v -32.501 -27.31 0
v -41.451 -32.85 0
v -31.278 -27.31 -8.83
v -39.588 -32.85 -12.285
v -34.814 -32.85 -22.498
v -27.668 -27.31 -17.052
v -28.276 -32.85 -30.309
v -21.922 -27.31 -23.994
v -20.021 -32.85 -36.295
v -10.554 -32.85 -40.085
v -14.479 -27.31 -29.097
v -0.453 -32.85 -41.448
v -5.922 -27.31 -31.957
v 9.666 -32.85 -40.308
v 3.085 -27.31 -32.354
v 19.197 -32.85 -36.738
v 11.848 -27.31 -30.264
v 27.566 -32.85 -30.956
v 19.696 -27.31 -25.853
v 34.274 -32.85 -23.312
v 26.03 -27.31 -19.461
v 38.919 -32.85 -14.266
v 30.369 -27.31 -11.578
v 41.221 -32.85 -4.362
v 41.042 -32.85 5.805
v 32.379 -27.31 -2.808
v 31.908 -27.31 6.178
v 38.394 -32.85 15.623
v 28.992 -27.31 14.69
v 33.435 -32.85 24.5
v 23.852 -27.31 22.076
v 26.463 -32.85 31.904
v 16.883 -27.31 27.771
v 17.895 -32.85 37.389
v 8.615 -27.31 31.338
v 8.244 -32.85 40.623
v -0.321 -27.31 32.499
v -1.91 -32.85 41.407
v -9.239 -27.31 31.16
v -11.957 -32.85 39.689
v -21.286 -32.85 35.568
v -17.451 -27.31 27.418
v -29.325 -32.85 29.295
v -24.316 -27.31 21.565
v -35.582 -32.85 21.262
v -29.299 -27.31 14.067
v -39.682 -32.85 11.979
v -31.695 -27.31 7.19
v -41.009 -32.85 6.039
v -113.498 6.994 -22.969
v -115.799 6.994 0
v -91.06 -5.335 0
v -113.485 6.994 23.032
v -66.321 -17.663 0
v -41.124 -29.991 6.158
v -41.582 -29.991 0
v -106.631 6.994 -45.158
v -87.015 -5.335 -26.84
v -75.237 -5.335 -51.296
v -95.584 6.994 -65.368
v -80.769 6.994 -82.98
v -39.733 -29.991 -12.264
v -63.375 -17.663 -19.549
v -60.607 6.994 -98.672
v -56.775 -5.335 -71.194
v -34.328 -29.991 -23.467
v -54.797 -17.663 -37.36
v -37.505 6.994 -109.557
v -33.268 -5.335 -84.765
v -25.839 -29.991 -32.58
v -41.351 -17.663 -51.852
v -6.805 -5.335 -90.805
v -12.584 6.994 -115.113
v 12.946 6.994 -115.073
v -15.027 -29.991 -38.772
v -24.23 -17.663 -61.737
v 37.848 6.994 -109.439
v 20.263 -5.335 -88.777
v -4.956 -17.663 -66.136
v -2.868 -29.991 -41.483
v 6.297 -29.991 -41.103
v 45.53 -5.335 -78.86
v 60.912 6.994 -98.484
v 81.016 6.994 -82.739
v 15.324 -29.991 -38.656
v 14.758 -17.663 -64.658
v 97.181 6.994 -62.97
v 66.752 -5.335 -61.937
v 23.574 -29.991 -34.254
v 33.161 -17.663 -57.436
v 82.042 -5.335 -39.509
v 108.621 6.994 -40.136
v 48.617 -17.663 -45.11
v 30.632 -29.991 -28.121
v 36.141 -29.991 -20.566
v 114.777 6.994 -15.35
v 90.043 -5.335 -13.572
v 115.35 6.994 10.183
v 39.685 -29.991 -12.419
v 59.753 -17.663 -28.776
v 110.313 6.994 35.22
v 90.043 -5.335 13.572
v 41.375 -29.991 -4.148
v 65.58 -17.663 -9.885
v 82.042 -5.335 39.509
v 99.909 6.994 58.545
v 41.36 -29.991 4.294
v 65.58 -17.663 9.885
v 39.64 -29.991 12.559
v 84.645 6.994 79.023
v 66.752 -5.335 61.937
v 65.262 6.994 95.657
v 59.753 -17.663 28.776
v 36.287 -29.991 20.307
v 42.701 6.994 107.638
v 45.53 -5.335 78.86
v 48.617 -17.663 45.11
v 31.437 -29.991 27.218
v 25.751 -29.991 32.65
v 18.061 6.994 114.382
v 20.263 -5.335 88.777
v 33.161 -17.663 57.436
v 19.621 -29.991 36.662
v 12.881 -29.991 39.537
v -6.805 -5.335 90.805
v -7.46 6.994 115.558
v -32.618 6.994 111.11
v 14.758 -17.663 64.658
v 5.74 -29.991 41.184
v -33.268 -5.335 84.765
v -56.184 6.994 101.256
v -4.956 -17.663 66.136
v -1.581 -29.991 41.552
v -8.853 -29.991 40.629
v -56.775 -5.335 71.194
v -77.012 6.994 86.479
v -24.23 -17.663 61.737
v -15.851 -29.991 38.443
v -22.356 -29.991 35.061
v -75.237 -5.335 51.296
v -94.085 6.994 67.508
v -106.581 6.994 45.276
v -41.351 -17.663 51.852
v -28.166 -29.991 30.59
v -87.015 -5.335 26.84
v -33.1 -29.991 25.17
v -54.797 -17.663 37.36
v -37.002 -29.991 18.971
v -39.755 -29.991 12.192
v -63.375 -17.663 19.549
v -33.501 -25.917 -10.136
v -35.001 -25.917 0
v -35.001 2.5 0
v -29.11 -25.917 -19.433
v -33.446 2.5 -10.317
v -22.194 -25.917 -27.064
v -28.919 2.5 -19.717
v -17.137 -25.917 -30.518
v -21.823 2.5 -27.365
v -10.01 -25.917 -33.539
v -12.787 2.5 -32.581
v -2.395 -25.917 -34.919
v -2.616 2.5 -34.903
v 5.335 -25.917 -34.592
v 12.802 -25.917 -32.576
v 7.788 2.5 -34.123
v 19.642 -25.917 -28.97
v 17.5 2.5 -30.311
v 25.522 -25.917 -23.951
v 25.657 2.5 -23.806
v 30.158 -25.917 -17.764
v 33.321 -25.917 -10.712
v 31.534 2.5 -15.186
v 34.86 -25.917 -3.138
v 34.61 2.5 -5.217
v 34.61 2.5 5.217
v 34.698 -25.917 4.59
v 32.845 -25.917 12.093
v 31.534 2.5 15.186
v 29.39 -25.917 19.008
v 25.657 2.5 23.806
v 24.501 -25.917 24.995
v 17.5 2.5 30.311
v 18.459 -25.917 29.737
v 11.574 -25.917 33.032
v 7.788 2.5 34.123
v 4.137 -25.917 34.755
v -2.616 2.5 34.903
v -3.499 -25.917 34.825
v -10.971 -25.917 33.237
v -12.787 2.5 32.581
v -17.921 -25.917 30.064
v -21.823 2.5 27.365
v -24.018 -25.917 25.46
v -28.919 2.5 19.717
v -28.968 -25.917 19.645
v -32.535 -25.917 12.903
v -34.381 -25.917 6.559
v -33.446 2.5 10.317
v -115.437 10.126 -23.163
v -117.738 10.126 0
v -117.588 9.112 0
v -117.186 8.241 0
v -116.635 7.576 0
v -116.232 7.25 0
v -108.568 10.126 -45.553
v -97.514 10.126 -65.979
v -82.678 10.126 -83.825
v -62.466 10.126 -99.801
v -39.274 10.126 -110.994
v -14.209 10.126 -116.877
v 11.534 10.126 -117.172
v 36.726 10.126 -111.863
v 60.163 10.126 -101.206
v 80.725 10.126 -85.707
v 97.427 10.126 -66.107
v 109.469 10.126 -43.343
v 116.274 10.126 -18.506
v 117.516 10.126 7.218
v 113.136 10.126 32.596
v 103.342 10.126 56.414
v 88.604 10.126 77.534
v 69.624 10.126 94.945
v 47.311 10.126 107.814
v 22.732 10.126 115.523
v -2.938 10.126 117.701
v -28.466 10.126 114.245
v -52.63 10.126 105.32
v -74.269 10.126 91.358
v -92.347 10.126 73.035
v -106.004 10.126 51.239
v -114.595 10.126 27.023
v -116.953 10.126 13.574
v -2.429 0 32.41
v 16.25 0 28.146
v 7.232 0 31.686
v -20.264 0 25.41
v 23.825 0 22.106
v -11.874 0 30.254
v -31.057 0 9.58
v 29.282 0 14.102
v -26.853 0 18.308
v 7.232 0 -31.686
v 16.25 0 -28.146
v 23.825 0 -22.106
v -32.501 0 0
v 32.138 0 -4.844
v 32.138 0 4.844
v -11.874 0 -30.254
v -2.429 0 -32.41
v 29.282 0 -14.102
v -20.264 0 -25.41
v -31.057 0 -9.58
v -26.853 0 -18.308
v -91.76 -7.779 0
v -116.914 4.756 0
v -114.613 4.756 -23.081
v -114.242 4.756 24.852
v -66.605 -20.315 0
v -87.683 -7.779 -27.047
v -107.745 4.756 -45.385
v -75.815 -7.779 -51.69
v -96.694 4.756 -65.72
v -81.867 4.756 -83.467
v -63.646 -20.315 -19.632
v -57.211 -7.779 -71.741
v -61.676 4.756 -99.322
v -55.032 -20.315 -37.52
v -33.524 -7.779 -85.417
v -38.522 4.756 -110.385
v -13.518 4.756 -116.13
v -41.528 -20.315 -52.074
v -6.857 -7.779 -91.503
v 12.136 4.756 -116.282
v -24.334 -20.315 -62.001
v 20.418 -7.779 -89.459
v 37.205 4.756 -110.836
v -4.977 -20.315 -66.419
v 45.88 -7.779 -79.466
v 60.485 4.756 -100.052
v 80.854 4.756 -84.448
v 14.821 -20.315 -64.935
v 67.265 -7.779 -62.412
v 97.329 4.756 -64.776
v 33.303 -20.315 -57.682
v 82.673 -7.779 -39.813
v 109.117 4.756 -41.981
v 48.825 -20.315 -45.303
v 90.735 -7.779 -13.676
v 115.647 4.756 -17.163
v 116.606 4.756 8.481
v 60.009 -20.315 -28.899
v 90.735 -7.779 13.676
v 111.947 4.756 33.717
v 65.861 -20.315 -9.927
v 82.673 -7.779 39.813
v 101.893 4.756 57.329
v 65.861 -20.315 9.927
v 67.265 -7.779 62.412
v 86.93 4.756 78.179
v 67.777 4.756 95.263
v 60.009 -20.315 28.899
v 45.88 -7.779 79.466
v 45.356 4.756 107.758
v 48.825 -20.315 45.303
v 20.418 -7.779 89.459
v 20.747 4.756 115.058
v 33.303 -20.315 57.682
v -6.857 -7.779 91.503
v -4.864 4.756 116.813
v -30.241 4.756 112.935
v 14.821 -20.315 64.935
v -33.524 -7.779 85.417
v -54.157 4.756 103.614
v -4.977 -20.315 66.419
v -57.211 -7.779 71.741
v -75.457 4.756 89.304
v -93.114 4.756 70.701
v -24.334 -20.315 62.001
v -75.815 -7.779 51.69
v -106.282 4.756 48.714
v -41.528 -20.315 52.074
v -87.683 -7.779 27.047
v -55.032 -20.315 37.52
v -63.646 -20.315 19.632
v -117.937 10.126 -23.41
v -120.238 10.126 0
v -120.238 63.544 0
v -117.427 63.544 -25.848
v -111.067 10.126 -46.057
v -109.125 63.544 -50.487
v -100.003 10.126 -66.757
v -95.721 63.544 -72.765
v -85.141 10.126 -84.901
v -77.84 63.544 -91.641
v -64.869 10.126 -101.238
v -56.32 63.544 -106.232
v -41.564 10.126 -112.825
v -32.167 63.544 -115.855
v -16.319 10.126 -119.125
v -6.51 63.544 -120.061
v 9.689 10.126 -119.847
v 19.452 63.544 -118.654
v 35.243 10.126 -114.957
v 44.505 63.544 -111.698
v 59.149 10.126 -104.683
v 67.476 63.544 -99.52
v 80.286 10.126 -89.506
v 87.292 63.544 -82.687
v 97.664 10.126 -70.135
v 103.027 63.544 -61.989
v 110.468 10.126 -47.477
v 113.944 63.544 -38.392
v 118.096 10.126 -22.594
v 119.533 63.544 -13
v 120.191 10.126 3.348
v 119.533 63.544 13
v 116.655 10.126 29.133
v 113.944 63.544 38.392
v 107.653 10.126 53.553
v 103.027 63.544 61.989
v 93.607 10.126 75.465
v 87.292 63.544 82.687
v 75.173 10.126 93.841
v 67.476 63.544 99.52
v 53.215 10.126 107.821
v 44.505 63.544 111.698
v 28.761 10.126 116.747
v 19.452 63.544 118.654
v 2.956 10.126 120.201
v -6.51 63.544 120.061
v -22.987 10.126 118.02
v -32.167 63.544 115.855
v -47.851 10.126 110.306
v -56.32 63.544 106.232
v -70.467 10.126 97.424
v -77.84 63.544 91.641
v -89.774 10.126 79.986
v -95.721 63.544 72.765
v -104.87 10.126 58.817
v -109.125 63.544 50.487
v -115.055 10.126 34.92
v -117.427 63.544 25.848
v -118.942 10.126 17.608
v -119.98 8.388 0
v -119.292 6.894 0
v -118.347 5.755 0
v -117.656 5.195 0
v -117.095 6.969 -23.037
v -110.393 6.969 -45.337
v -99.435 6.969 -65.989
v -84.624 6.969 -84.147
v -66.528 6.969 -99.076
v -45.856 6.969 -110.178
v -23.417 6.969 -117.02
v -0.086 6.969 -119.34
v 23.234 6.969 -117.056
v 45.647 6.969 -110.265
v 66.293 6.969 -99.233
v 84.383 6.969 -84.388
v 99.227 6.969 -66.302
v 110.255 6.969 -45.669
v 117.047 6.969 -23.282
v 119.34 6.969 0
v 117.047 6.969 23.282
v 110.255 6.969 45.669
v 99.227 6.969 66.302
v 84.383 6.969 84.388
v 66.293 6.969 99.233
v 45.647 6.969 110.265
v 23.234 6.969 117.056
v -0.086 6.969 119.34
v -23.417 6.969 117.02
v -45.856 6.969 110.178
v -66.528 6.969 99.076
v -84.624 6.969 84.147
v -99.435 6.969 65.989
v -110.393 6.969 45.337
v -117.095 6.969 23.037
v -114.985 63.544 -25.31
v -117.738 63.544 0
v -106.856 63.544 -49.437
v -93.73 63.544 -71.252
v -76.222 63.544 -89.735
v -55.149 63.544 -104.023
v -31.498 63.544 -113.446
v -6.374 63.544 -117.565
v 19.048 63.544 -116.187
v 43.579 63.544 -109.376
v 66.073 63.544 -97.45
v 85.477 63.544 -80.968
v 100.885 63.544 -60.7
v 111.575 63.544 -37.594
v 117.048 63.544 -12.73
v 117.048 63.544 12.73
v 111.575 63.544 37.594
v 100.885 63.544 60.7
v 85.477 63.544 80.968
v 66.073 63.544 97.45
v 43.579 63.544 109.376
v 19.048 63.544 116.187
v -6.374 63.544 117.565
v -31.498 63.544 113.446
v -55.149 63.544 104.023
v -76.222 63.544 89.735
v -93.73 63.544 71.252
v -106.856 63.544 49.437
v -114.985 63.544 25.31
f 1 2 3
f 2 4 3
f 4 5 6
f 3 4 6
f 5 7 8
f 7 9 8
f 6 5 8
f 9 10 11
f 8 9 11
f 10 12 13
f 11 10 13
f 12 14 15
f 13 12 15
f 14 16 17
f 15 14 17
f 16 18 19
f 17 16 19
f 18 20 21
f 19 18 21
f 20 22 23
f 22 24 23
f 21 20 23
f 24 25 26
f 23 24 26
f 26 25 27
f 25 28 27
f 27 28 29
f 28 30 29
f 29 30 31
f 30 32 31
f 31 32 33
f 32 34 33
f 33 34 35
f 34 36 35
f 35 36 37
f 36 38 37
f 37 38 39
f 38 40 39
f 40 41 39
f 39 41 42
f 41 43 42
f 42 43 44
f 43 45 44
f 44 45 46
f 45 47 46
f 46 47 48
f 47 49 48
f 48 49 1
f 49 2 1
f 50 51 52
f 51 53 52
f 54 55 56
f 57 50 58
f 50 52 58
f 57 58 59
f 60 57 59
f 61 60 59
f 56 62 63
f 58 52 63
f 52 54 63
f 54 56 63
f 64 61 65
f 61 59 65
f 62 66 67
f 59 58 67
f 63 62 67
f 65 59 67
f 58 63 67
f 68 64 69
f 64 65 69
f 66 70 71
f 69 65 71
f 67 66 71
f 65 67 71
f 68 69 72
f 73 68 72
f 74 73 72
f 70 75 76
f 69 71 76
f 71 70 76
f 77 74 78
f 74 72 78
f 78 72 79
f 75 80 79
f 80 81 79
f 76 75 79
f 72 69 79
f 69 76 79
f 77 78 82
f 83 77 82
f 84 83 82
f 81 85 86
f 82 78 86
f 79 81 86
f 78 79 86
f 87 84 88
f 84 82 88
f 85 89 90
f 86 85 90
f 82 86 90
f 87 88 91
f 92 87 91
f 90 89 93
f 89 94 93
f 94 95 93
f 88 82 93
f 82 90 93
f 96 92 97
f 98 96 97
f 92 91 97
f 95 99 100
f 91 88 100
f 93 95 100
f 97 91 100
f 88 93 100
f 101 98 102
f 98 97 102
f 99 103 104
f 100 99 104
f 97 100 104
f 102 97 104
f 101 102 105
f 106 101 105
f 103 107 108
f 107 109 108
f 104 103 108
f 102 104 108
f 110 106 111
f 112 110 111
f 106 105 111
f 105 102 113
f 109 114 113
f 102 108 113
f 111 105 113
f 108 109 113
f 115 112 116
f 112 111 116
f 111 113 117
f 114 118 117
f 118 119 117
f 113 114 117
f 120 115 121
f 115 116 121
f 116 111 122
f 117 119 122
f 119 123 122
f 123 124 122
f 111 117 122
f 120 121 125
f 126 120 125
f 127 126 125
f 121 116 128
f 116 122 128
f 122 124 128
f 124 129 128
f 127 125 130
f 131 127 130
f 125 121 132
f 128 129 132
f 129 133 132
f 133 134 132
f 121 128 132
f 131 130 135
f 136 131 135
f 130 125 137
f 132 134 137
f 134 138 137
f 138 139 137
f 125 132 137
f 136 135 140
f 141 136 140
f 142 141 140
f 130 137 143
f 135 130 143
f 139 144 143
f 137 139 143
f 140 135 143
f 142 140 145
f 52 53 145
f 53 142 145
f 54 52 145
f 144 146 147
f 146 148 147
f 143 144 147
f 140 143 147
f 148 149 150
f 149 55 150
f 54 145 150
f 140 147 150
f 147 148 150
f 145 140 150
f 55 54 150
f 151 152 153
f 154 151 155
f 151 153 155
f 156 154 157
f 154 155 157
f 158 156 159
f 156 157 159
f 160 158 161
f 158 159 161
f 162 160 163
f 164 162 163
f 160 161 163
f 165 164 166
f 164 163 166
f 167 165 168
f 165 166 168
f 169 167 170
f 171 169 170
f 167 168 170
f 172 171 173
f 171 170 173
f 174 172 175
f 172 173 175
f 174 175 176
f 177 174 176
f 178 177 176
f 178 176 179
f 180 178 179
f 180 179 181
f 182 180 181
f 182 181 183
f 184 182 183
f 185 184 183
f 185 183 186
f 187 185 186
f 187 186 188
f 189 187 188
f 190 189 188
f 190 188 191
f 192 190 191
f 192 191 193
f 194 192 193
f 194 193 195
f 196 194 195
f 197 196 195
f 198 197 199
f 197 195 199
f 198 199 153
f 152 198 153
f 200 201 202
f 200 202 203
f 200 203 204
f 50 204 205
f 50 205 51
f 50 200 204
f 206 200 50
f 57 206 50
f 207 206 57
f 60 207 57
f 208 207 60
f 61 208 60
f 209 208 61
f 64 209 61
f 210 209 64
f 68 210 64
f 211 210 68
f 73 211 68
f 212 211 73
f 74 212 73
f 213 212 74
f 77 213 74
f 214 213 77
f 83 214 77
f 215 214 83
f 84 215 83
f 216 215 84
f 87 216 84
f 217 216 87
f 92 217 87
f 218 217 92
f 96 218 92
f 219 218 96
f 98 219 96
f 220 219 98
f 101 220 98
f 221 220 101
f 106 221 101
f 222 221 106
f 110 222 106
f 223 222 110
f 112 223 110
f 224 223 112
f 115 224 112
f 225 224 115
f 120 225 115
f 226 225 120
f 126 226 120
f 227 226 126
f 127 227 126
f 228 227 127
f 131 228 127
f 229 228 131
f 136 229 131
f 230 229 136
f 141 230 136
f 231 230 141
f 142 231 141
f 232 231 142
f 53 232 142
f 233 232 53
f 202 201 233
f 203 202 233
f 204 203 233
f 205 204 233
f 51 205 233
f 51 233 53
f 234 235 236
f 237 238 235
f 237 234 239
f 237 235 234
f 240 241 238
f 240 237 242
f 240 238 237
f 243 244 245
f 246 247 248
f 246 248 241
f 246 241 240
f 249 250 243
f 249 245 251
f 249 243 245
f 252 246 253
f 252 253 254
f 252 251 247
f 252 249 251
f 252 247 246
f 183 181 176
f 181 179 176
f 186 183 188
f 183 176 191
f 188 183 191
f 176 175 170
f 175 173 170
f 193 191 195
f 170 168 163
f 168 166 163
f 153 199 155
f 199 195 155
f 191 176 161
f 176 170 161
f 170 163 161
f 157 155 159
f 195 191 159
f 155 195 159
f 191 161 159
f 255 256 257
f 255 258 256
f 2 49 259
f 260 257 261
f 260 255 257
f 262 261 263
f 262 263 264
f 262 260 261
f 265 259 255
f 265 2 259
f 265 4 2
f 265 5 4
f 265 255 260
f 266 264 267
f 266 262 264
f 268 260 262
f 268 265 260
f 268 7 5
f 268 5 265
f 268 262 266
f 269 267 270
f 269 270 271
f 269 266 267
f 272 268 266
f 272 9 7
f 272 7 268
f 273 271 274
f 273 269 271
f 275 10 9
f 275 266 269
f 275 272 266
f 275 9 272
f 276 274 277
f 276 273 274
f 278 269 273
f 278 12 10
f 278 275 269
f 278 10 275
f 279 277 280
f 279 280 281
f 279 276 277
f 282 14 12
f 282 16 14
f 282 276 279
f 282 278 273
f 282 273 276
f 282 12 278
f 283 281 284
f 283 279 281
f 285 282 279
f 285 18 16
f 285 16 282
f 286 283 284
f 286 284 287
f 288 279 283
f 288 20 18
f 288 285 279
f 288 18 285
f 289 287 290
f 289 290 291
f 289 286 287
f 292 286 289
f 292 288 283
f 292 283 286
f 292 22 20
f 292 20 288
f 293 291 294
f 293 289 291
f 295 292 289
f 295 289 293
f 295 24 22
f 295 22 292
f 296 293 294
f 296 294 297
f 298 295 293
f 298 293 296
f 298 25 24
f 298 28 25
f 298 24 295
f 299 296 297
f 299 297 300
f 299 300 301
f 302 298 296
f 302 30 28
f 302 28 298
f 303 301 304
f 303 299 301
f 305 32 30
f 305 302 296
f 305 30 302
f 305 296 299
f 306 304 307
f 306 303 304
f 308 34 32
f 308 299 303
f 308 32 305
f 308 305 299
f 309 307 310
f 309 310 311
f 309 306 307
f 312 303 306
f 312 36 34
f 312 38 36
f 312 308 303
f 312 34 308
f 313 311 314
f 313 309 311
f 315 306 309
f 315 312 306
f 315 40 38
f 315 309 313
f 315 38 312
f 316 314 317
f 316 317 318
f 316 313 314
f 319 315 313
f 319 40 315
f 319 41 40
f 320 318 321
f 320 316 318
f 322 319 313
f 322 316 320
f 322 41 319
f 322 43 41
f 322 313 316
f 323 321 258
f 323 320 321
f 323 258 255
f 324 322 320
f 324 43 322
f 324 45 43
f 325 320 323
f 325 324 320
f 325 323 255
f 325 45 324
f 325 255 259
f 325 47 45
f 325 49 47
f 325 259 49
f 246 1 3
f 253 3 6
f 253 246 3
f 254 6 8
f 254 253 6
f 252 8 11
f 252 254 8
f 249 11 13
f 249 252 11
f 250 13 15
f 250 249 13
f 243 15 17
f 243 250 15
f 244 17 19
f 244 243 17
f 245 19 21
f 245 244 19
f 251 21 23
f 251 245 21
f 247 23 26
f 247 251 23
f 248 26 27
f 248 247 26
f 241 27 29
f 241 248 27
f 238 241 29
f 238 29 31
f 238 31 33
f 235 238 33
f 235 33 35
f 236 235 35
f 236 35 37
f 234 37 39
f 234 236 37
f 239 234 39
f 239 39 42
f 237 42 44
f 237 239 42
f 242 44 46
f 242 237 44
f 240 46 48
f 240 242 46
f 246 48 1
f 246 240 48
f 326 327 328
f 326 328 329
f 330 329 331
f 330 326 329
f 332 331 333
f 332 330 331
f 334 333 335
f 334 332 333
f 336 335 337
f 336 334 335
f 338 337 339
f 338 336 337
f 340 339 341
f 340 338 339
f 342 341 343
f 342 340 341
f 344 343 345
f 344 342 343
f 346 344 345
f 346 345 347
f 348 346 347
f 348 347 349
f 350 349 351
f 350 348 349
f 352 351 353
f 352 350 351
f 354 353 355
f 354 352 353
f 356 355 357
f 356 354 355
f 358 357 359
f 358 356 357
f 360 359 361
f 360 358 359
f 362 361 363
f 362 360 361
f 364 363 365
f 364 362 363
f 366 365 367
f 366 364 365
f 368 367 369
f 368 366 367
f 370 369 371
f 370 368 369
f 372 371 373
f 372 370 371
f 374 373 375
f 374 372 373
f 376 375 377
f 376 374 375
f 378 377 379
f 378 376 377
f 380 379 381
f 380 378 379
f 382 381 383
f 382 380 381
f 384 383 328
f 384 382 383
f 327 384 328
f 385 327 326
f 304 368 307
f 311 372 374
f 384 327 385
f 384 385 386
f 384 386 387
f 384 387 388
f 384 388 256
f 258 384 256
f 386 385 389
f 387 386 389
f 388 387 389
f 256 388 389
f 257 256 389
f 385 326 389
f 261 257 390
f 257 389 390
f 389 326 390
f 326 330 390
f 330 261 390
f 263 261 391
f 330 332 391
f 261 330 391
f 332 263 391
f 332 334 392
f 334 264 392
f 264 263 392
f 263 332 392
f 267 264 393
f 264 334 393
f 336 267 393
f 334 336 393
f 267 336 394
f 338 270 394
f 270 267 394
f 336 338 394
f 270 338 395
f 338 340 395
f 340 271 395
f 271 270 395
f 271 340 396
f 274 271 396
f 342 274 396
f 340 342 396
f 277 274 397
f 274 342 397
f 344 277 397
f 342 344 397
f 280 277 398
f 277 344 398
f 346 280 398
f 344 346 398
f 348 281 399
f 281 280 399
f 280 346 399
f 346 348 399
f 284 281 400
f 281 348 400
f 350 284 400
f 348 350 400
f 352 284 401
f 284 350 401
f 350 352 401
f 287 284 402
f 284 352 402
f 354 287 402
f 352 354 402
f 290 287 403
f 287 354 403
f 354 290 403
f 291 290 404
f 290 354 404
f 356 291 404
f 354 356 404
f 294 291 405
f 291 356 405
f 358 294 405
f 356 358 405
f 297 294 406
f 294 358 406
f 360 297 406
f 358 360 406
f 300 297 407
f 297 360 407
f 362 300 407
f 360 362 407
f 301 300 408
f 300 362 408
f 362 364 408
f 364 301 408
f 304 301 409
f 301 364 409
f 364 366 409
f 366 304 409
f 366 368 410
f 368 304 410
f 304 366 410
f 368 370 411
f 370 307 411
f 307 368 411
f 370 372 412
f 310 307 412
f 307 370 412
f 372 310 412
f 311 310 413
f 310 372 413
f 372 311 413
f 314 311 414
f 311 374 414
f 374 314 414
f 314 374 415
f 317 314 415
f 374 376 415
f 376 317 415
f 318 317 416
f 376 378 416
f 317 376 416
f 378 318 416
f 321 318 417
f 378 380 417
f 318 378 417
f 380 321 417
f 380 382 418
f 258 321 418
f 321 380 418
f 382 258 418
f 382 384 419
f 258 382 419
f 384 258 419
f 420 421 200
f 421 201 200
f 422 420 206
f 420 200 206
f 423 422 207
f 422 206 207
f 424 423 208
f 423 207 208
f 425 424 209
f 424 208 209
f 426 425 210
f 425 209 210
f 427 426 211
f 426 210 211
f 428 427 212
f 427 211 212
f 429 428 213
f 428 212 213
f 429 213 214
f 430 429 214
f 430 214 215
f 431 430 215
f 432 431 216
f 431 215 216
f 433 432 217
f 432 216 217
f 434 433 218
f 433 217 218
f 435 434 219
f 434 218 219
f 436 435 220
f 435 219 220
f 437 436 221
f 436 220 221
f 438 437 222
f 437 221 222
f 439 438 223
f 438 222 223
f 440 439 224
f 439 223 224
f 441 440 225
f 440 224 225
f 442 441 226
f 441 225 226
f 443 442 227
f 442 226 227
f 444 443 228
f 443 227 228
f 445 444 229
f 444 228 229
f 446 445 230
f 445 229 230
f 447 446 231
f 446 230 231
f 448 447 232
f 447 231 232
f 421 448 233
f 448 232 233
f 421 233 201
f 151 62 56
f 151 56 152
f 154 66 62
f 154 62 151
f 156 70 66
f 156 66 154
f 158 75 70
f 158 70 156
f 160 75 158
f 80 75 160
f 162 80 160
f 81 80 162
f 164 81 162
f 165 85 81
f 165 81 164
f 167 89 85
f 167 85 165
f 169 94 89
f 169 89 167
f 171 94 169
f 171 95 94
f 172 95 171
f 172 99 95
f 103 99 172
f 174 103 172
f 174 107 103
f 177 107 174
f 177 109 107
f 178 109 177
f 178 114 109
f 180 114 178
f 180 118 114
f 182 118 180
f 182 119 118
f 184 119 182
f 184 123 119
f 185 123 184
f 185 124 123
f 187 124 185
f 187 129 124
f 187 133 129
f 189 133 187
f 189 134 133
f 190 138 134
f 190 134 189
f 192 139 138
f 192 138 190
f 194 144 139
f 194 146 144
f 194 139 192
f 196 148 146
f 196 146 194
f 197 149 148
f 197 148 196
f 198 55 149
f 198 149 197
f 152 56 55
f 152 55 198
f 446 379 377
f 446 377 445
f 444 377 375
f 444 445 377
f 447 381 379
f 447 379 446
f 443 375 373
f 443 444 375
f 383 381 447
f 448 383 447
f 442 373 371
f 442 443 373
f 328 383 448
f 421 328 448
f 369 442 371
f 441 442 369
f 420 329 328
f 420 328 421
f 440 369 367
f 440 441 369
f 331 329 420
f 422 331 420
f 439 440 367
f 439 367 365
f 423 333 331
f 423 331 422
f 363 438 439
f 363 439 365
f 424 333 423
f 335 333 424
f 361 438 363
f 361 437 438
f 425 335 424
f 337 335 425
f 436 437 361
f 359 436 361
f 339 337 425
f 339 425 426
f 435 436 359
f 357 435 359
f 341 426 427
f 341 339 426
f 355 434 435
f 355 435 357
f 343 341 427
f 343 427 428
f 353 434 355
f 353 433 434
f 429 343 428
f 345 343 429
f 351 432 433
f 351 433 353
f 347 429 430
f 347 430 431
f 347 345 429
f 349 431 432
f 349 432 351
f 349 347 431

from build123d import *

# Parameters (mm, degrees)
F2_R    = 6
F3_SIZE = 10
F4_T    = -2.5


with BuildPart() as f1:
    # F0 (on Top) → F1 (revolve)
    with BuildSketch(Plane.XY):
        Polygon((-120.2378347516, 63.5438784957), (-120.2378347516, 6.4126844518), (-32.5006470084, -37.3101644218), (-32.5006470084, 0), (0, 0), (0, 63.5438784957), align=None)
    revolve(axis=Axis((0, 18.9465675503, 0), (0, -1, 0)))

    # F2
    f2_edges = [f1.edges().sort_by_distance(p)[0] for p in [
        (120.237835, 6.412684, 0),
    ]]
    fillet(f2_edges, radius=F2_R)

    # F3
    f3_edges = [f1.edges().sort_by_distance(p)[0] for p in [
        (32.500647, -37.310164, 0),
    ]]
    chamfer(f3_edges, length=F3_SIZE)

    # F4
    f4_openings = [f1.faces().sort_by_distance(p)[0] for p in [
        (0, 63.543878, 0),
    ]]
    offset(amount=F4_T, openings=f4_openings, kind=Kind.INTERSECTION)


solid = f1.part
